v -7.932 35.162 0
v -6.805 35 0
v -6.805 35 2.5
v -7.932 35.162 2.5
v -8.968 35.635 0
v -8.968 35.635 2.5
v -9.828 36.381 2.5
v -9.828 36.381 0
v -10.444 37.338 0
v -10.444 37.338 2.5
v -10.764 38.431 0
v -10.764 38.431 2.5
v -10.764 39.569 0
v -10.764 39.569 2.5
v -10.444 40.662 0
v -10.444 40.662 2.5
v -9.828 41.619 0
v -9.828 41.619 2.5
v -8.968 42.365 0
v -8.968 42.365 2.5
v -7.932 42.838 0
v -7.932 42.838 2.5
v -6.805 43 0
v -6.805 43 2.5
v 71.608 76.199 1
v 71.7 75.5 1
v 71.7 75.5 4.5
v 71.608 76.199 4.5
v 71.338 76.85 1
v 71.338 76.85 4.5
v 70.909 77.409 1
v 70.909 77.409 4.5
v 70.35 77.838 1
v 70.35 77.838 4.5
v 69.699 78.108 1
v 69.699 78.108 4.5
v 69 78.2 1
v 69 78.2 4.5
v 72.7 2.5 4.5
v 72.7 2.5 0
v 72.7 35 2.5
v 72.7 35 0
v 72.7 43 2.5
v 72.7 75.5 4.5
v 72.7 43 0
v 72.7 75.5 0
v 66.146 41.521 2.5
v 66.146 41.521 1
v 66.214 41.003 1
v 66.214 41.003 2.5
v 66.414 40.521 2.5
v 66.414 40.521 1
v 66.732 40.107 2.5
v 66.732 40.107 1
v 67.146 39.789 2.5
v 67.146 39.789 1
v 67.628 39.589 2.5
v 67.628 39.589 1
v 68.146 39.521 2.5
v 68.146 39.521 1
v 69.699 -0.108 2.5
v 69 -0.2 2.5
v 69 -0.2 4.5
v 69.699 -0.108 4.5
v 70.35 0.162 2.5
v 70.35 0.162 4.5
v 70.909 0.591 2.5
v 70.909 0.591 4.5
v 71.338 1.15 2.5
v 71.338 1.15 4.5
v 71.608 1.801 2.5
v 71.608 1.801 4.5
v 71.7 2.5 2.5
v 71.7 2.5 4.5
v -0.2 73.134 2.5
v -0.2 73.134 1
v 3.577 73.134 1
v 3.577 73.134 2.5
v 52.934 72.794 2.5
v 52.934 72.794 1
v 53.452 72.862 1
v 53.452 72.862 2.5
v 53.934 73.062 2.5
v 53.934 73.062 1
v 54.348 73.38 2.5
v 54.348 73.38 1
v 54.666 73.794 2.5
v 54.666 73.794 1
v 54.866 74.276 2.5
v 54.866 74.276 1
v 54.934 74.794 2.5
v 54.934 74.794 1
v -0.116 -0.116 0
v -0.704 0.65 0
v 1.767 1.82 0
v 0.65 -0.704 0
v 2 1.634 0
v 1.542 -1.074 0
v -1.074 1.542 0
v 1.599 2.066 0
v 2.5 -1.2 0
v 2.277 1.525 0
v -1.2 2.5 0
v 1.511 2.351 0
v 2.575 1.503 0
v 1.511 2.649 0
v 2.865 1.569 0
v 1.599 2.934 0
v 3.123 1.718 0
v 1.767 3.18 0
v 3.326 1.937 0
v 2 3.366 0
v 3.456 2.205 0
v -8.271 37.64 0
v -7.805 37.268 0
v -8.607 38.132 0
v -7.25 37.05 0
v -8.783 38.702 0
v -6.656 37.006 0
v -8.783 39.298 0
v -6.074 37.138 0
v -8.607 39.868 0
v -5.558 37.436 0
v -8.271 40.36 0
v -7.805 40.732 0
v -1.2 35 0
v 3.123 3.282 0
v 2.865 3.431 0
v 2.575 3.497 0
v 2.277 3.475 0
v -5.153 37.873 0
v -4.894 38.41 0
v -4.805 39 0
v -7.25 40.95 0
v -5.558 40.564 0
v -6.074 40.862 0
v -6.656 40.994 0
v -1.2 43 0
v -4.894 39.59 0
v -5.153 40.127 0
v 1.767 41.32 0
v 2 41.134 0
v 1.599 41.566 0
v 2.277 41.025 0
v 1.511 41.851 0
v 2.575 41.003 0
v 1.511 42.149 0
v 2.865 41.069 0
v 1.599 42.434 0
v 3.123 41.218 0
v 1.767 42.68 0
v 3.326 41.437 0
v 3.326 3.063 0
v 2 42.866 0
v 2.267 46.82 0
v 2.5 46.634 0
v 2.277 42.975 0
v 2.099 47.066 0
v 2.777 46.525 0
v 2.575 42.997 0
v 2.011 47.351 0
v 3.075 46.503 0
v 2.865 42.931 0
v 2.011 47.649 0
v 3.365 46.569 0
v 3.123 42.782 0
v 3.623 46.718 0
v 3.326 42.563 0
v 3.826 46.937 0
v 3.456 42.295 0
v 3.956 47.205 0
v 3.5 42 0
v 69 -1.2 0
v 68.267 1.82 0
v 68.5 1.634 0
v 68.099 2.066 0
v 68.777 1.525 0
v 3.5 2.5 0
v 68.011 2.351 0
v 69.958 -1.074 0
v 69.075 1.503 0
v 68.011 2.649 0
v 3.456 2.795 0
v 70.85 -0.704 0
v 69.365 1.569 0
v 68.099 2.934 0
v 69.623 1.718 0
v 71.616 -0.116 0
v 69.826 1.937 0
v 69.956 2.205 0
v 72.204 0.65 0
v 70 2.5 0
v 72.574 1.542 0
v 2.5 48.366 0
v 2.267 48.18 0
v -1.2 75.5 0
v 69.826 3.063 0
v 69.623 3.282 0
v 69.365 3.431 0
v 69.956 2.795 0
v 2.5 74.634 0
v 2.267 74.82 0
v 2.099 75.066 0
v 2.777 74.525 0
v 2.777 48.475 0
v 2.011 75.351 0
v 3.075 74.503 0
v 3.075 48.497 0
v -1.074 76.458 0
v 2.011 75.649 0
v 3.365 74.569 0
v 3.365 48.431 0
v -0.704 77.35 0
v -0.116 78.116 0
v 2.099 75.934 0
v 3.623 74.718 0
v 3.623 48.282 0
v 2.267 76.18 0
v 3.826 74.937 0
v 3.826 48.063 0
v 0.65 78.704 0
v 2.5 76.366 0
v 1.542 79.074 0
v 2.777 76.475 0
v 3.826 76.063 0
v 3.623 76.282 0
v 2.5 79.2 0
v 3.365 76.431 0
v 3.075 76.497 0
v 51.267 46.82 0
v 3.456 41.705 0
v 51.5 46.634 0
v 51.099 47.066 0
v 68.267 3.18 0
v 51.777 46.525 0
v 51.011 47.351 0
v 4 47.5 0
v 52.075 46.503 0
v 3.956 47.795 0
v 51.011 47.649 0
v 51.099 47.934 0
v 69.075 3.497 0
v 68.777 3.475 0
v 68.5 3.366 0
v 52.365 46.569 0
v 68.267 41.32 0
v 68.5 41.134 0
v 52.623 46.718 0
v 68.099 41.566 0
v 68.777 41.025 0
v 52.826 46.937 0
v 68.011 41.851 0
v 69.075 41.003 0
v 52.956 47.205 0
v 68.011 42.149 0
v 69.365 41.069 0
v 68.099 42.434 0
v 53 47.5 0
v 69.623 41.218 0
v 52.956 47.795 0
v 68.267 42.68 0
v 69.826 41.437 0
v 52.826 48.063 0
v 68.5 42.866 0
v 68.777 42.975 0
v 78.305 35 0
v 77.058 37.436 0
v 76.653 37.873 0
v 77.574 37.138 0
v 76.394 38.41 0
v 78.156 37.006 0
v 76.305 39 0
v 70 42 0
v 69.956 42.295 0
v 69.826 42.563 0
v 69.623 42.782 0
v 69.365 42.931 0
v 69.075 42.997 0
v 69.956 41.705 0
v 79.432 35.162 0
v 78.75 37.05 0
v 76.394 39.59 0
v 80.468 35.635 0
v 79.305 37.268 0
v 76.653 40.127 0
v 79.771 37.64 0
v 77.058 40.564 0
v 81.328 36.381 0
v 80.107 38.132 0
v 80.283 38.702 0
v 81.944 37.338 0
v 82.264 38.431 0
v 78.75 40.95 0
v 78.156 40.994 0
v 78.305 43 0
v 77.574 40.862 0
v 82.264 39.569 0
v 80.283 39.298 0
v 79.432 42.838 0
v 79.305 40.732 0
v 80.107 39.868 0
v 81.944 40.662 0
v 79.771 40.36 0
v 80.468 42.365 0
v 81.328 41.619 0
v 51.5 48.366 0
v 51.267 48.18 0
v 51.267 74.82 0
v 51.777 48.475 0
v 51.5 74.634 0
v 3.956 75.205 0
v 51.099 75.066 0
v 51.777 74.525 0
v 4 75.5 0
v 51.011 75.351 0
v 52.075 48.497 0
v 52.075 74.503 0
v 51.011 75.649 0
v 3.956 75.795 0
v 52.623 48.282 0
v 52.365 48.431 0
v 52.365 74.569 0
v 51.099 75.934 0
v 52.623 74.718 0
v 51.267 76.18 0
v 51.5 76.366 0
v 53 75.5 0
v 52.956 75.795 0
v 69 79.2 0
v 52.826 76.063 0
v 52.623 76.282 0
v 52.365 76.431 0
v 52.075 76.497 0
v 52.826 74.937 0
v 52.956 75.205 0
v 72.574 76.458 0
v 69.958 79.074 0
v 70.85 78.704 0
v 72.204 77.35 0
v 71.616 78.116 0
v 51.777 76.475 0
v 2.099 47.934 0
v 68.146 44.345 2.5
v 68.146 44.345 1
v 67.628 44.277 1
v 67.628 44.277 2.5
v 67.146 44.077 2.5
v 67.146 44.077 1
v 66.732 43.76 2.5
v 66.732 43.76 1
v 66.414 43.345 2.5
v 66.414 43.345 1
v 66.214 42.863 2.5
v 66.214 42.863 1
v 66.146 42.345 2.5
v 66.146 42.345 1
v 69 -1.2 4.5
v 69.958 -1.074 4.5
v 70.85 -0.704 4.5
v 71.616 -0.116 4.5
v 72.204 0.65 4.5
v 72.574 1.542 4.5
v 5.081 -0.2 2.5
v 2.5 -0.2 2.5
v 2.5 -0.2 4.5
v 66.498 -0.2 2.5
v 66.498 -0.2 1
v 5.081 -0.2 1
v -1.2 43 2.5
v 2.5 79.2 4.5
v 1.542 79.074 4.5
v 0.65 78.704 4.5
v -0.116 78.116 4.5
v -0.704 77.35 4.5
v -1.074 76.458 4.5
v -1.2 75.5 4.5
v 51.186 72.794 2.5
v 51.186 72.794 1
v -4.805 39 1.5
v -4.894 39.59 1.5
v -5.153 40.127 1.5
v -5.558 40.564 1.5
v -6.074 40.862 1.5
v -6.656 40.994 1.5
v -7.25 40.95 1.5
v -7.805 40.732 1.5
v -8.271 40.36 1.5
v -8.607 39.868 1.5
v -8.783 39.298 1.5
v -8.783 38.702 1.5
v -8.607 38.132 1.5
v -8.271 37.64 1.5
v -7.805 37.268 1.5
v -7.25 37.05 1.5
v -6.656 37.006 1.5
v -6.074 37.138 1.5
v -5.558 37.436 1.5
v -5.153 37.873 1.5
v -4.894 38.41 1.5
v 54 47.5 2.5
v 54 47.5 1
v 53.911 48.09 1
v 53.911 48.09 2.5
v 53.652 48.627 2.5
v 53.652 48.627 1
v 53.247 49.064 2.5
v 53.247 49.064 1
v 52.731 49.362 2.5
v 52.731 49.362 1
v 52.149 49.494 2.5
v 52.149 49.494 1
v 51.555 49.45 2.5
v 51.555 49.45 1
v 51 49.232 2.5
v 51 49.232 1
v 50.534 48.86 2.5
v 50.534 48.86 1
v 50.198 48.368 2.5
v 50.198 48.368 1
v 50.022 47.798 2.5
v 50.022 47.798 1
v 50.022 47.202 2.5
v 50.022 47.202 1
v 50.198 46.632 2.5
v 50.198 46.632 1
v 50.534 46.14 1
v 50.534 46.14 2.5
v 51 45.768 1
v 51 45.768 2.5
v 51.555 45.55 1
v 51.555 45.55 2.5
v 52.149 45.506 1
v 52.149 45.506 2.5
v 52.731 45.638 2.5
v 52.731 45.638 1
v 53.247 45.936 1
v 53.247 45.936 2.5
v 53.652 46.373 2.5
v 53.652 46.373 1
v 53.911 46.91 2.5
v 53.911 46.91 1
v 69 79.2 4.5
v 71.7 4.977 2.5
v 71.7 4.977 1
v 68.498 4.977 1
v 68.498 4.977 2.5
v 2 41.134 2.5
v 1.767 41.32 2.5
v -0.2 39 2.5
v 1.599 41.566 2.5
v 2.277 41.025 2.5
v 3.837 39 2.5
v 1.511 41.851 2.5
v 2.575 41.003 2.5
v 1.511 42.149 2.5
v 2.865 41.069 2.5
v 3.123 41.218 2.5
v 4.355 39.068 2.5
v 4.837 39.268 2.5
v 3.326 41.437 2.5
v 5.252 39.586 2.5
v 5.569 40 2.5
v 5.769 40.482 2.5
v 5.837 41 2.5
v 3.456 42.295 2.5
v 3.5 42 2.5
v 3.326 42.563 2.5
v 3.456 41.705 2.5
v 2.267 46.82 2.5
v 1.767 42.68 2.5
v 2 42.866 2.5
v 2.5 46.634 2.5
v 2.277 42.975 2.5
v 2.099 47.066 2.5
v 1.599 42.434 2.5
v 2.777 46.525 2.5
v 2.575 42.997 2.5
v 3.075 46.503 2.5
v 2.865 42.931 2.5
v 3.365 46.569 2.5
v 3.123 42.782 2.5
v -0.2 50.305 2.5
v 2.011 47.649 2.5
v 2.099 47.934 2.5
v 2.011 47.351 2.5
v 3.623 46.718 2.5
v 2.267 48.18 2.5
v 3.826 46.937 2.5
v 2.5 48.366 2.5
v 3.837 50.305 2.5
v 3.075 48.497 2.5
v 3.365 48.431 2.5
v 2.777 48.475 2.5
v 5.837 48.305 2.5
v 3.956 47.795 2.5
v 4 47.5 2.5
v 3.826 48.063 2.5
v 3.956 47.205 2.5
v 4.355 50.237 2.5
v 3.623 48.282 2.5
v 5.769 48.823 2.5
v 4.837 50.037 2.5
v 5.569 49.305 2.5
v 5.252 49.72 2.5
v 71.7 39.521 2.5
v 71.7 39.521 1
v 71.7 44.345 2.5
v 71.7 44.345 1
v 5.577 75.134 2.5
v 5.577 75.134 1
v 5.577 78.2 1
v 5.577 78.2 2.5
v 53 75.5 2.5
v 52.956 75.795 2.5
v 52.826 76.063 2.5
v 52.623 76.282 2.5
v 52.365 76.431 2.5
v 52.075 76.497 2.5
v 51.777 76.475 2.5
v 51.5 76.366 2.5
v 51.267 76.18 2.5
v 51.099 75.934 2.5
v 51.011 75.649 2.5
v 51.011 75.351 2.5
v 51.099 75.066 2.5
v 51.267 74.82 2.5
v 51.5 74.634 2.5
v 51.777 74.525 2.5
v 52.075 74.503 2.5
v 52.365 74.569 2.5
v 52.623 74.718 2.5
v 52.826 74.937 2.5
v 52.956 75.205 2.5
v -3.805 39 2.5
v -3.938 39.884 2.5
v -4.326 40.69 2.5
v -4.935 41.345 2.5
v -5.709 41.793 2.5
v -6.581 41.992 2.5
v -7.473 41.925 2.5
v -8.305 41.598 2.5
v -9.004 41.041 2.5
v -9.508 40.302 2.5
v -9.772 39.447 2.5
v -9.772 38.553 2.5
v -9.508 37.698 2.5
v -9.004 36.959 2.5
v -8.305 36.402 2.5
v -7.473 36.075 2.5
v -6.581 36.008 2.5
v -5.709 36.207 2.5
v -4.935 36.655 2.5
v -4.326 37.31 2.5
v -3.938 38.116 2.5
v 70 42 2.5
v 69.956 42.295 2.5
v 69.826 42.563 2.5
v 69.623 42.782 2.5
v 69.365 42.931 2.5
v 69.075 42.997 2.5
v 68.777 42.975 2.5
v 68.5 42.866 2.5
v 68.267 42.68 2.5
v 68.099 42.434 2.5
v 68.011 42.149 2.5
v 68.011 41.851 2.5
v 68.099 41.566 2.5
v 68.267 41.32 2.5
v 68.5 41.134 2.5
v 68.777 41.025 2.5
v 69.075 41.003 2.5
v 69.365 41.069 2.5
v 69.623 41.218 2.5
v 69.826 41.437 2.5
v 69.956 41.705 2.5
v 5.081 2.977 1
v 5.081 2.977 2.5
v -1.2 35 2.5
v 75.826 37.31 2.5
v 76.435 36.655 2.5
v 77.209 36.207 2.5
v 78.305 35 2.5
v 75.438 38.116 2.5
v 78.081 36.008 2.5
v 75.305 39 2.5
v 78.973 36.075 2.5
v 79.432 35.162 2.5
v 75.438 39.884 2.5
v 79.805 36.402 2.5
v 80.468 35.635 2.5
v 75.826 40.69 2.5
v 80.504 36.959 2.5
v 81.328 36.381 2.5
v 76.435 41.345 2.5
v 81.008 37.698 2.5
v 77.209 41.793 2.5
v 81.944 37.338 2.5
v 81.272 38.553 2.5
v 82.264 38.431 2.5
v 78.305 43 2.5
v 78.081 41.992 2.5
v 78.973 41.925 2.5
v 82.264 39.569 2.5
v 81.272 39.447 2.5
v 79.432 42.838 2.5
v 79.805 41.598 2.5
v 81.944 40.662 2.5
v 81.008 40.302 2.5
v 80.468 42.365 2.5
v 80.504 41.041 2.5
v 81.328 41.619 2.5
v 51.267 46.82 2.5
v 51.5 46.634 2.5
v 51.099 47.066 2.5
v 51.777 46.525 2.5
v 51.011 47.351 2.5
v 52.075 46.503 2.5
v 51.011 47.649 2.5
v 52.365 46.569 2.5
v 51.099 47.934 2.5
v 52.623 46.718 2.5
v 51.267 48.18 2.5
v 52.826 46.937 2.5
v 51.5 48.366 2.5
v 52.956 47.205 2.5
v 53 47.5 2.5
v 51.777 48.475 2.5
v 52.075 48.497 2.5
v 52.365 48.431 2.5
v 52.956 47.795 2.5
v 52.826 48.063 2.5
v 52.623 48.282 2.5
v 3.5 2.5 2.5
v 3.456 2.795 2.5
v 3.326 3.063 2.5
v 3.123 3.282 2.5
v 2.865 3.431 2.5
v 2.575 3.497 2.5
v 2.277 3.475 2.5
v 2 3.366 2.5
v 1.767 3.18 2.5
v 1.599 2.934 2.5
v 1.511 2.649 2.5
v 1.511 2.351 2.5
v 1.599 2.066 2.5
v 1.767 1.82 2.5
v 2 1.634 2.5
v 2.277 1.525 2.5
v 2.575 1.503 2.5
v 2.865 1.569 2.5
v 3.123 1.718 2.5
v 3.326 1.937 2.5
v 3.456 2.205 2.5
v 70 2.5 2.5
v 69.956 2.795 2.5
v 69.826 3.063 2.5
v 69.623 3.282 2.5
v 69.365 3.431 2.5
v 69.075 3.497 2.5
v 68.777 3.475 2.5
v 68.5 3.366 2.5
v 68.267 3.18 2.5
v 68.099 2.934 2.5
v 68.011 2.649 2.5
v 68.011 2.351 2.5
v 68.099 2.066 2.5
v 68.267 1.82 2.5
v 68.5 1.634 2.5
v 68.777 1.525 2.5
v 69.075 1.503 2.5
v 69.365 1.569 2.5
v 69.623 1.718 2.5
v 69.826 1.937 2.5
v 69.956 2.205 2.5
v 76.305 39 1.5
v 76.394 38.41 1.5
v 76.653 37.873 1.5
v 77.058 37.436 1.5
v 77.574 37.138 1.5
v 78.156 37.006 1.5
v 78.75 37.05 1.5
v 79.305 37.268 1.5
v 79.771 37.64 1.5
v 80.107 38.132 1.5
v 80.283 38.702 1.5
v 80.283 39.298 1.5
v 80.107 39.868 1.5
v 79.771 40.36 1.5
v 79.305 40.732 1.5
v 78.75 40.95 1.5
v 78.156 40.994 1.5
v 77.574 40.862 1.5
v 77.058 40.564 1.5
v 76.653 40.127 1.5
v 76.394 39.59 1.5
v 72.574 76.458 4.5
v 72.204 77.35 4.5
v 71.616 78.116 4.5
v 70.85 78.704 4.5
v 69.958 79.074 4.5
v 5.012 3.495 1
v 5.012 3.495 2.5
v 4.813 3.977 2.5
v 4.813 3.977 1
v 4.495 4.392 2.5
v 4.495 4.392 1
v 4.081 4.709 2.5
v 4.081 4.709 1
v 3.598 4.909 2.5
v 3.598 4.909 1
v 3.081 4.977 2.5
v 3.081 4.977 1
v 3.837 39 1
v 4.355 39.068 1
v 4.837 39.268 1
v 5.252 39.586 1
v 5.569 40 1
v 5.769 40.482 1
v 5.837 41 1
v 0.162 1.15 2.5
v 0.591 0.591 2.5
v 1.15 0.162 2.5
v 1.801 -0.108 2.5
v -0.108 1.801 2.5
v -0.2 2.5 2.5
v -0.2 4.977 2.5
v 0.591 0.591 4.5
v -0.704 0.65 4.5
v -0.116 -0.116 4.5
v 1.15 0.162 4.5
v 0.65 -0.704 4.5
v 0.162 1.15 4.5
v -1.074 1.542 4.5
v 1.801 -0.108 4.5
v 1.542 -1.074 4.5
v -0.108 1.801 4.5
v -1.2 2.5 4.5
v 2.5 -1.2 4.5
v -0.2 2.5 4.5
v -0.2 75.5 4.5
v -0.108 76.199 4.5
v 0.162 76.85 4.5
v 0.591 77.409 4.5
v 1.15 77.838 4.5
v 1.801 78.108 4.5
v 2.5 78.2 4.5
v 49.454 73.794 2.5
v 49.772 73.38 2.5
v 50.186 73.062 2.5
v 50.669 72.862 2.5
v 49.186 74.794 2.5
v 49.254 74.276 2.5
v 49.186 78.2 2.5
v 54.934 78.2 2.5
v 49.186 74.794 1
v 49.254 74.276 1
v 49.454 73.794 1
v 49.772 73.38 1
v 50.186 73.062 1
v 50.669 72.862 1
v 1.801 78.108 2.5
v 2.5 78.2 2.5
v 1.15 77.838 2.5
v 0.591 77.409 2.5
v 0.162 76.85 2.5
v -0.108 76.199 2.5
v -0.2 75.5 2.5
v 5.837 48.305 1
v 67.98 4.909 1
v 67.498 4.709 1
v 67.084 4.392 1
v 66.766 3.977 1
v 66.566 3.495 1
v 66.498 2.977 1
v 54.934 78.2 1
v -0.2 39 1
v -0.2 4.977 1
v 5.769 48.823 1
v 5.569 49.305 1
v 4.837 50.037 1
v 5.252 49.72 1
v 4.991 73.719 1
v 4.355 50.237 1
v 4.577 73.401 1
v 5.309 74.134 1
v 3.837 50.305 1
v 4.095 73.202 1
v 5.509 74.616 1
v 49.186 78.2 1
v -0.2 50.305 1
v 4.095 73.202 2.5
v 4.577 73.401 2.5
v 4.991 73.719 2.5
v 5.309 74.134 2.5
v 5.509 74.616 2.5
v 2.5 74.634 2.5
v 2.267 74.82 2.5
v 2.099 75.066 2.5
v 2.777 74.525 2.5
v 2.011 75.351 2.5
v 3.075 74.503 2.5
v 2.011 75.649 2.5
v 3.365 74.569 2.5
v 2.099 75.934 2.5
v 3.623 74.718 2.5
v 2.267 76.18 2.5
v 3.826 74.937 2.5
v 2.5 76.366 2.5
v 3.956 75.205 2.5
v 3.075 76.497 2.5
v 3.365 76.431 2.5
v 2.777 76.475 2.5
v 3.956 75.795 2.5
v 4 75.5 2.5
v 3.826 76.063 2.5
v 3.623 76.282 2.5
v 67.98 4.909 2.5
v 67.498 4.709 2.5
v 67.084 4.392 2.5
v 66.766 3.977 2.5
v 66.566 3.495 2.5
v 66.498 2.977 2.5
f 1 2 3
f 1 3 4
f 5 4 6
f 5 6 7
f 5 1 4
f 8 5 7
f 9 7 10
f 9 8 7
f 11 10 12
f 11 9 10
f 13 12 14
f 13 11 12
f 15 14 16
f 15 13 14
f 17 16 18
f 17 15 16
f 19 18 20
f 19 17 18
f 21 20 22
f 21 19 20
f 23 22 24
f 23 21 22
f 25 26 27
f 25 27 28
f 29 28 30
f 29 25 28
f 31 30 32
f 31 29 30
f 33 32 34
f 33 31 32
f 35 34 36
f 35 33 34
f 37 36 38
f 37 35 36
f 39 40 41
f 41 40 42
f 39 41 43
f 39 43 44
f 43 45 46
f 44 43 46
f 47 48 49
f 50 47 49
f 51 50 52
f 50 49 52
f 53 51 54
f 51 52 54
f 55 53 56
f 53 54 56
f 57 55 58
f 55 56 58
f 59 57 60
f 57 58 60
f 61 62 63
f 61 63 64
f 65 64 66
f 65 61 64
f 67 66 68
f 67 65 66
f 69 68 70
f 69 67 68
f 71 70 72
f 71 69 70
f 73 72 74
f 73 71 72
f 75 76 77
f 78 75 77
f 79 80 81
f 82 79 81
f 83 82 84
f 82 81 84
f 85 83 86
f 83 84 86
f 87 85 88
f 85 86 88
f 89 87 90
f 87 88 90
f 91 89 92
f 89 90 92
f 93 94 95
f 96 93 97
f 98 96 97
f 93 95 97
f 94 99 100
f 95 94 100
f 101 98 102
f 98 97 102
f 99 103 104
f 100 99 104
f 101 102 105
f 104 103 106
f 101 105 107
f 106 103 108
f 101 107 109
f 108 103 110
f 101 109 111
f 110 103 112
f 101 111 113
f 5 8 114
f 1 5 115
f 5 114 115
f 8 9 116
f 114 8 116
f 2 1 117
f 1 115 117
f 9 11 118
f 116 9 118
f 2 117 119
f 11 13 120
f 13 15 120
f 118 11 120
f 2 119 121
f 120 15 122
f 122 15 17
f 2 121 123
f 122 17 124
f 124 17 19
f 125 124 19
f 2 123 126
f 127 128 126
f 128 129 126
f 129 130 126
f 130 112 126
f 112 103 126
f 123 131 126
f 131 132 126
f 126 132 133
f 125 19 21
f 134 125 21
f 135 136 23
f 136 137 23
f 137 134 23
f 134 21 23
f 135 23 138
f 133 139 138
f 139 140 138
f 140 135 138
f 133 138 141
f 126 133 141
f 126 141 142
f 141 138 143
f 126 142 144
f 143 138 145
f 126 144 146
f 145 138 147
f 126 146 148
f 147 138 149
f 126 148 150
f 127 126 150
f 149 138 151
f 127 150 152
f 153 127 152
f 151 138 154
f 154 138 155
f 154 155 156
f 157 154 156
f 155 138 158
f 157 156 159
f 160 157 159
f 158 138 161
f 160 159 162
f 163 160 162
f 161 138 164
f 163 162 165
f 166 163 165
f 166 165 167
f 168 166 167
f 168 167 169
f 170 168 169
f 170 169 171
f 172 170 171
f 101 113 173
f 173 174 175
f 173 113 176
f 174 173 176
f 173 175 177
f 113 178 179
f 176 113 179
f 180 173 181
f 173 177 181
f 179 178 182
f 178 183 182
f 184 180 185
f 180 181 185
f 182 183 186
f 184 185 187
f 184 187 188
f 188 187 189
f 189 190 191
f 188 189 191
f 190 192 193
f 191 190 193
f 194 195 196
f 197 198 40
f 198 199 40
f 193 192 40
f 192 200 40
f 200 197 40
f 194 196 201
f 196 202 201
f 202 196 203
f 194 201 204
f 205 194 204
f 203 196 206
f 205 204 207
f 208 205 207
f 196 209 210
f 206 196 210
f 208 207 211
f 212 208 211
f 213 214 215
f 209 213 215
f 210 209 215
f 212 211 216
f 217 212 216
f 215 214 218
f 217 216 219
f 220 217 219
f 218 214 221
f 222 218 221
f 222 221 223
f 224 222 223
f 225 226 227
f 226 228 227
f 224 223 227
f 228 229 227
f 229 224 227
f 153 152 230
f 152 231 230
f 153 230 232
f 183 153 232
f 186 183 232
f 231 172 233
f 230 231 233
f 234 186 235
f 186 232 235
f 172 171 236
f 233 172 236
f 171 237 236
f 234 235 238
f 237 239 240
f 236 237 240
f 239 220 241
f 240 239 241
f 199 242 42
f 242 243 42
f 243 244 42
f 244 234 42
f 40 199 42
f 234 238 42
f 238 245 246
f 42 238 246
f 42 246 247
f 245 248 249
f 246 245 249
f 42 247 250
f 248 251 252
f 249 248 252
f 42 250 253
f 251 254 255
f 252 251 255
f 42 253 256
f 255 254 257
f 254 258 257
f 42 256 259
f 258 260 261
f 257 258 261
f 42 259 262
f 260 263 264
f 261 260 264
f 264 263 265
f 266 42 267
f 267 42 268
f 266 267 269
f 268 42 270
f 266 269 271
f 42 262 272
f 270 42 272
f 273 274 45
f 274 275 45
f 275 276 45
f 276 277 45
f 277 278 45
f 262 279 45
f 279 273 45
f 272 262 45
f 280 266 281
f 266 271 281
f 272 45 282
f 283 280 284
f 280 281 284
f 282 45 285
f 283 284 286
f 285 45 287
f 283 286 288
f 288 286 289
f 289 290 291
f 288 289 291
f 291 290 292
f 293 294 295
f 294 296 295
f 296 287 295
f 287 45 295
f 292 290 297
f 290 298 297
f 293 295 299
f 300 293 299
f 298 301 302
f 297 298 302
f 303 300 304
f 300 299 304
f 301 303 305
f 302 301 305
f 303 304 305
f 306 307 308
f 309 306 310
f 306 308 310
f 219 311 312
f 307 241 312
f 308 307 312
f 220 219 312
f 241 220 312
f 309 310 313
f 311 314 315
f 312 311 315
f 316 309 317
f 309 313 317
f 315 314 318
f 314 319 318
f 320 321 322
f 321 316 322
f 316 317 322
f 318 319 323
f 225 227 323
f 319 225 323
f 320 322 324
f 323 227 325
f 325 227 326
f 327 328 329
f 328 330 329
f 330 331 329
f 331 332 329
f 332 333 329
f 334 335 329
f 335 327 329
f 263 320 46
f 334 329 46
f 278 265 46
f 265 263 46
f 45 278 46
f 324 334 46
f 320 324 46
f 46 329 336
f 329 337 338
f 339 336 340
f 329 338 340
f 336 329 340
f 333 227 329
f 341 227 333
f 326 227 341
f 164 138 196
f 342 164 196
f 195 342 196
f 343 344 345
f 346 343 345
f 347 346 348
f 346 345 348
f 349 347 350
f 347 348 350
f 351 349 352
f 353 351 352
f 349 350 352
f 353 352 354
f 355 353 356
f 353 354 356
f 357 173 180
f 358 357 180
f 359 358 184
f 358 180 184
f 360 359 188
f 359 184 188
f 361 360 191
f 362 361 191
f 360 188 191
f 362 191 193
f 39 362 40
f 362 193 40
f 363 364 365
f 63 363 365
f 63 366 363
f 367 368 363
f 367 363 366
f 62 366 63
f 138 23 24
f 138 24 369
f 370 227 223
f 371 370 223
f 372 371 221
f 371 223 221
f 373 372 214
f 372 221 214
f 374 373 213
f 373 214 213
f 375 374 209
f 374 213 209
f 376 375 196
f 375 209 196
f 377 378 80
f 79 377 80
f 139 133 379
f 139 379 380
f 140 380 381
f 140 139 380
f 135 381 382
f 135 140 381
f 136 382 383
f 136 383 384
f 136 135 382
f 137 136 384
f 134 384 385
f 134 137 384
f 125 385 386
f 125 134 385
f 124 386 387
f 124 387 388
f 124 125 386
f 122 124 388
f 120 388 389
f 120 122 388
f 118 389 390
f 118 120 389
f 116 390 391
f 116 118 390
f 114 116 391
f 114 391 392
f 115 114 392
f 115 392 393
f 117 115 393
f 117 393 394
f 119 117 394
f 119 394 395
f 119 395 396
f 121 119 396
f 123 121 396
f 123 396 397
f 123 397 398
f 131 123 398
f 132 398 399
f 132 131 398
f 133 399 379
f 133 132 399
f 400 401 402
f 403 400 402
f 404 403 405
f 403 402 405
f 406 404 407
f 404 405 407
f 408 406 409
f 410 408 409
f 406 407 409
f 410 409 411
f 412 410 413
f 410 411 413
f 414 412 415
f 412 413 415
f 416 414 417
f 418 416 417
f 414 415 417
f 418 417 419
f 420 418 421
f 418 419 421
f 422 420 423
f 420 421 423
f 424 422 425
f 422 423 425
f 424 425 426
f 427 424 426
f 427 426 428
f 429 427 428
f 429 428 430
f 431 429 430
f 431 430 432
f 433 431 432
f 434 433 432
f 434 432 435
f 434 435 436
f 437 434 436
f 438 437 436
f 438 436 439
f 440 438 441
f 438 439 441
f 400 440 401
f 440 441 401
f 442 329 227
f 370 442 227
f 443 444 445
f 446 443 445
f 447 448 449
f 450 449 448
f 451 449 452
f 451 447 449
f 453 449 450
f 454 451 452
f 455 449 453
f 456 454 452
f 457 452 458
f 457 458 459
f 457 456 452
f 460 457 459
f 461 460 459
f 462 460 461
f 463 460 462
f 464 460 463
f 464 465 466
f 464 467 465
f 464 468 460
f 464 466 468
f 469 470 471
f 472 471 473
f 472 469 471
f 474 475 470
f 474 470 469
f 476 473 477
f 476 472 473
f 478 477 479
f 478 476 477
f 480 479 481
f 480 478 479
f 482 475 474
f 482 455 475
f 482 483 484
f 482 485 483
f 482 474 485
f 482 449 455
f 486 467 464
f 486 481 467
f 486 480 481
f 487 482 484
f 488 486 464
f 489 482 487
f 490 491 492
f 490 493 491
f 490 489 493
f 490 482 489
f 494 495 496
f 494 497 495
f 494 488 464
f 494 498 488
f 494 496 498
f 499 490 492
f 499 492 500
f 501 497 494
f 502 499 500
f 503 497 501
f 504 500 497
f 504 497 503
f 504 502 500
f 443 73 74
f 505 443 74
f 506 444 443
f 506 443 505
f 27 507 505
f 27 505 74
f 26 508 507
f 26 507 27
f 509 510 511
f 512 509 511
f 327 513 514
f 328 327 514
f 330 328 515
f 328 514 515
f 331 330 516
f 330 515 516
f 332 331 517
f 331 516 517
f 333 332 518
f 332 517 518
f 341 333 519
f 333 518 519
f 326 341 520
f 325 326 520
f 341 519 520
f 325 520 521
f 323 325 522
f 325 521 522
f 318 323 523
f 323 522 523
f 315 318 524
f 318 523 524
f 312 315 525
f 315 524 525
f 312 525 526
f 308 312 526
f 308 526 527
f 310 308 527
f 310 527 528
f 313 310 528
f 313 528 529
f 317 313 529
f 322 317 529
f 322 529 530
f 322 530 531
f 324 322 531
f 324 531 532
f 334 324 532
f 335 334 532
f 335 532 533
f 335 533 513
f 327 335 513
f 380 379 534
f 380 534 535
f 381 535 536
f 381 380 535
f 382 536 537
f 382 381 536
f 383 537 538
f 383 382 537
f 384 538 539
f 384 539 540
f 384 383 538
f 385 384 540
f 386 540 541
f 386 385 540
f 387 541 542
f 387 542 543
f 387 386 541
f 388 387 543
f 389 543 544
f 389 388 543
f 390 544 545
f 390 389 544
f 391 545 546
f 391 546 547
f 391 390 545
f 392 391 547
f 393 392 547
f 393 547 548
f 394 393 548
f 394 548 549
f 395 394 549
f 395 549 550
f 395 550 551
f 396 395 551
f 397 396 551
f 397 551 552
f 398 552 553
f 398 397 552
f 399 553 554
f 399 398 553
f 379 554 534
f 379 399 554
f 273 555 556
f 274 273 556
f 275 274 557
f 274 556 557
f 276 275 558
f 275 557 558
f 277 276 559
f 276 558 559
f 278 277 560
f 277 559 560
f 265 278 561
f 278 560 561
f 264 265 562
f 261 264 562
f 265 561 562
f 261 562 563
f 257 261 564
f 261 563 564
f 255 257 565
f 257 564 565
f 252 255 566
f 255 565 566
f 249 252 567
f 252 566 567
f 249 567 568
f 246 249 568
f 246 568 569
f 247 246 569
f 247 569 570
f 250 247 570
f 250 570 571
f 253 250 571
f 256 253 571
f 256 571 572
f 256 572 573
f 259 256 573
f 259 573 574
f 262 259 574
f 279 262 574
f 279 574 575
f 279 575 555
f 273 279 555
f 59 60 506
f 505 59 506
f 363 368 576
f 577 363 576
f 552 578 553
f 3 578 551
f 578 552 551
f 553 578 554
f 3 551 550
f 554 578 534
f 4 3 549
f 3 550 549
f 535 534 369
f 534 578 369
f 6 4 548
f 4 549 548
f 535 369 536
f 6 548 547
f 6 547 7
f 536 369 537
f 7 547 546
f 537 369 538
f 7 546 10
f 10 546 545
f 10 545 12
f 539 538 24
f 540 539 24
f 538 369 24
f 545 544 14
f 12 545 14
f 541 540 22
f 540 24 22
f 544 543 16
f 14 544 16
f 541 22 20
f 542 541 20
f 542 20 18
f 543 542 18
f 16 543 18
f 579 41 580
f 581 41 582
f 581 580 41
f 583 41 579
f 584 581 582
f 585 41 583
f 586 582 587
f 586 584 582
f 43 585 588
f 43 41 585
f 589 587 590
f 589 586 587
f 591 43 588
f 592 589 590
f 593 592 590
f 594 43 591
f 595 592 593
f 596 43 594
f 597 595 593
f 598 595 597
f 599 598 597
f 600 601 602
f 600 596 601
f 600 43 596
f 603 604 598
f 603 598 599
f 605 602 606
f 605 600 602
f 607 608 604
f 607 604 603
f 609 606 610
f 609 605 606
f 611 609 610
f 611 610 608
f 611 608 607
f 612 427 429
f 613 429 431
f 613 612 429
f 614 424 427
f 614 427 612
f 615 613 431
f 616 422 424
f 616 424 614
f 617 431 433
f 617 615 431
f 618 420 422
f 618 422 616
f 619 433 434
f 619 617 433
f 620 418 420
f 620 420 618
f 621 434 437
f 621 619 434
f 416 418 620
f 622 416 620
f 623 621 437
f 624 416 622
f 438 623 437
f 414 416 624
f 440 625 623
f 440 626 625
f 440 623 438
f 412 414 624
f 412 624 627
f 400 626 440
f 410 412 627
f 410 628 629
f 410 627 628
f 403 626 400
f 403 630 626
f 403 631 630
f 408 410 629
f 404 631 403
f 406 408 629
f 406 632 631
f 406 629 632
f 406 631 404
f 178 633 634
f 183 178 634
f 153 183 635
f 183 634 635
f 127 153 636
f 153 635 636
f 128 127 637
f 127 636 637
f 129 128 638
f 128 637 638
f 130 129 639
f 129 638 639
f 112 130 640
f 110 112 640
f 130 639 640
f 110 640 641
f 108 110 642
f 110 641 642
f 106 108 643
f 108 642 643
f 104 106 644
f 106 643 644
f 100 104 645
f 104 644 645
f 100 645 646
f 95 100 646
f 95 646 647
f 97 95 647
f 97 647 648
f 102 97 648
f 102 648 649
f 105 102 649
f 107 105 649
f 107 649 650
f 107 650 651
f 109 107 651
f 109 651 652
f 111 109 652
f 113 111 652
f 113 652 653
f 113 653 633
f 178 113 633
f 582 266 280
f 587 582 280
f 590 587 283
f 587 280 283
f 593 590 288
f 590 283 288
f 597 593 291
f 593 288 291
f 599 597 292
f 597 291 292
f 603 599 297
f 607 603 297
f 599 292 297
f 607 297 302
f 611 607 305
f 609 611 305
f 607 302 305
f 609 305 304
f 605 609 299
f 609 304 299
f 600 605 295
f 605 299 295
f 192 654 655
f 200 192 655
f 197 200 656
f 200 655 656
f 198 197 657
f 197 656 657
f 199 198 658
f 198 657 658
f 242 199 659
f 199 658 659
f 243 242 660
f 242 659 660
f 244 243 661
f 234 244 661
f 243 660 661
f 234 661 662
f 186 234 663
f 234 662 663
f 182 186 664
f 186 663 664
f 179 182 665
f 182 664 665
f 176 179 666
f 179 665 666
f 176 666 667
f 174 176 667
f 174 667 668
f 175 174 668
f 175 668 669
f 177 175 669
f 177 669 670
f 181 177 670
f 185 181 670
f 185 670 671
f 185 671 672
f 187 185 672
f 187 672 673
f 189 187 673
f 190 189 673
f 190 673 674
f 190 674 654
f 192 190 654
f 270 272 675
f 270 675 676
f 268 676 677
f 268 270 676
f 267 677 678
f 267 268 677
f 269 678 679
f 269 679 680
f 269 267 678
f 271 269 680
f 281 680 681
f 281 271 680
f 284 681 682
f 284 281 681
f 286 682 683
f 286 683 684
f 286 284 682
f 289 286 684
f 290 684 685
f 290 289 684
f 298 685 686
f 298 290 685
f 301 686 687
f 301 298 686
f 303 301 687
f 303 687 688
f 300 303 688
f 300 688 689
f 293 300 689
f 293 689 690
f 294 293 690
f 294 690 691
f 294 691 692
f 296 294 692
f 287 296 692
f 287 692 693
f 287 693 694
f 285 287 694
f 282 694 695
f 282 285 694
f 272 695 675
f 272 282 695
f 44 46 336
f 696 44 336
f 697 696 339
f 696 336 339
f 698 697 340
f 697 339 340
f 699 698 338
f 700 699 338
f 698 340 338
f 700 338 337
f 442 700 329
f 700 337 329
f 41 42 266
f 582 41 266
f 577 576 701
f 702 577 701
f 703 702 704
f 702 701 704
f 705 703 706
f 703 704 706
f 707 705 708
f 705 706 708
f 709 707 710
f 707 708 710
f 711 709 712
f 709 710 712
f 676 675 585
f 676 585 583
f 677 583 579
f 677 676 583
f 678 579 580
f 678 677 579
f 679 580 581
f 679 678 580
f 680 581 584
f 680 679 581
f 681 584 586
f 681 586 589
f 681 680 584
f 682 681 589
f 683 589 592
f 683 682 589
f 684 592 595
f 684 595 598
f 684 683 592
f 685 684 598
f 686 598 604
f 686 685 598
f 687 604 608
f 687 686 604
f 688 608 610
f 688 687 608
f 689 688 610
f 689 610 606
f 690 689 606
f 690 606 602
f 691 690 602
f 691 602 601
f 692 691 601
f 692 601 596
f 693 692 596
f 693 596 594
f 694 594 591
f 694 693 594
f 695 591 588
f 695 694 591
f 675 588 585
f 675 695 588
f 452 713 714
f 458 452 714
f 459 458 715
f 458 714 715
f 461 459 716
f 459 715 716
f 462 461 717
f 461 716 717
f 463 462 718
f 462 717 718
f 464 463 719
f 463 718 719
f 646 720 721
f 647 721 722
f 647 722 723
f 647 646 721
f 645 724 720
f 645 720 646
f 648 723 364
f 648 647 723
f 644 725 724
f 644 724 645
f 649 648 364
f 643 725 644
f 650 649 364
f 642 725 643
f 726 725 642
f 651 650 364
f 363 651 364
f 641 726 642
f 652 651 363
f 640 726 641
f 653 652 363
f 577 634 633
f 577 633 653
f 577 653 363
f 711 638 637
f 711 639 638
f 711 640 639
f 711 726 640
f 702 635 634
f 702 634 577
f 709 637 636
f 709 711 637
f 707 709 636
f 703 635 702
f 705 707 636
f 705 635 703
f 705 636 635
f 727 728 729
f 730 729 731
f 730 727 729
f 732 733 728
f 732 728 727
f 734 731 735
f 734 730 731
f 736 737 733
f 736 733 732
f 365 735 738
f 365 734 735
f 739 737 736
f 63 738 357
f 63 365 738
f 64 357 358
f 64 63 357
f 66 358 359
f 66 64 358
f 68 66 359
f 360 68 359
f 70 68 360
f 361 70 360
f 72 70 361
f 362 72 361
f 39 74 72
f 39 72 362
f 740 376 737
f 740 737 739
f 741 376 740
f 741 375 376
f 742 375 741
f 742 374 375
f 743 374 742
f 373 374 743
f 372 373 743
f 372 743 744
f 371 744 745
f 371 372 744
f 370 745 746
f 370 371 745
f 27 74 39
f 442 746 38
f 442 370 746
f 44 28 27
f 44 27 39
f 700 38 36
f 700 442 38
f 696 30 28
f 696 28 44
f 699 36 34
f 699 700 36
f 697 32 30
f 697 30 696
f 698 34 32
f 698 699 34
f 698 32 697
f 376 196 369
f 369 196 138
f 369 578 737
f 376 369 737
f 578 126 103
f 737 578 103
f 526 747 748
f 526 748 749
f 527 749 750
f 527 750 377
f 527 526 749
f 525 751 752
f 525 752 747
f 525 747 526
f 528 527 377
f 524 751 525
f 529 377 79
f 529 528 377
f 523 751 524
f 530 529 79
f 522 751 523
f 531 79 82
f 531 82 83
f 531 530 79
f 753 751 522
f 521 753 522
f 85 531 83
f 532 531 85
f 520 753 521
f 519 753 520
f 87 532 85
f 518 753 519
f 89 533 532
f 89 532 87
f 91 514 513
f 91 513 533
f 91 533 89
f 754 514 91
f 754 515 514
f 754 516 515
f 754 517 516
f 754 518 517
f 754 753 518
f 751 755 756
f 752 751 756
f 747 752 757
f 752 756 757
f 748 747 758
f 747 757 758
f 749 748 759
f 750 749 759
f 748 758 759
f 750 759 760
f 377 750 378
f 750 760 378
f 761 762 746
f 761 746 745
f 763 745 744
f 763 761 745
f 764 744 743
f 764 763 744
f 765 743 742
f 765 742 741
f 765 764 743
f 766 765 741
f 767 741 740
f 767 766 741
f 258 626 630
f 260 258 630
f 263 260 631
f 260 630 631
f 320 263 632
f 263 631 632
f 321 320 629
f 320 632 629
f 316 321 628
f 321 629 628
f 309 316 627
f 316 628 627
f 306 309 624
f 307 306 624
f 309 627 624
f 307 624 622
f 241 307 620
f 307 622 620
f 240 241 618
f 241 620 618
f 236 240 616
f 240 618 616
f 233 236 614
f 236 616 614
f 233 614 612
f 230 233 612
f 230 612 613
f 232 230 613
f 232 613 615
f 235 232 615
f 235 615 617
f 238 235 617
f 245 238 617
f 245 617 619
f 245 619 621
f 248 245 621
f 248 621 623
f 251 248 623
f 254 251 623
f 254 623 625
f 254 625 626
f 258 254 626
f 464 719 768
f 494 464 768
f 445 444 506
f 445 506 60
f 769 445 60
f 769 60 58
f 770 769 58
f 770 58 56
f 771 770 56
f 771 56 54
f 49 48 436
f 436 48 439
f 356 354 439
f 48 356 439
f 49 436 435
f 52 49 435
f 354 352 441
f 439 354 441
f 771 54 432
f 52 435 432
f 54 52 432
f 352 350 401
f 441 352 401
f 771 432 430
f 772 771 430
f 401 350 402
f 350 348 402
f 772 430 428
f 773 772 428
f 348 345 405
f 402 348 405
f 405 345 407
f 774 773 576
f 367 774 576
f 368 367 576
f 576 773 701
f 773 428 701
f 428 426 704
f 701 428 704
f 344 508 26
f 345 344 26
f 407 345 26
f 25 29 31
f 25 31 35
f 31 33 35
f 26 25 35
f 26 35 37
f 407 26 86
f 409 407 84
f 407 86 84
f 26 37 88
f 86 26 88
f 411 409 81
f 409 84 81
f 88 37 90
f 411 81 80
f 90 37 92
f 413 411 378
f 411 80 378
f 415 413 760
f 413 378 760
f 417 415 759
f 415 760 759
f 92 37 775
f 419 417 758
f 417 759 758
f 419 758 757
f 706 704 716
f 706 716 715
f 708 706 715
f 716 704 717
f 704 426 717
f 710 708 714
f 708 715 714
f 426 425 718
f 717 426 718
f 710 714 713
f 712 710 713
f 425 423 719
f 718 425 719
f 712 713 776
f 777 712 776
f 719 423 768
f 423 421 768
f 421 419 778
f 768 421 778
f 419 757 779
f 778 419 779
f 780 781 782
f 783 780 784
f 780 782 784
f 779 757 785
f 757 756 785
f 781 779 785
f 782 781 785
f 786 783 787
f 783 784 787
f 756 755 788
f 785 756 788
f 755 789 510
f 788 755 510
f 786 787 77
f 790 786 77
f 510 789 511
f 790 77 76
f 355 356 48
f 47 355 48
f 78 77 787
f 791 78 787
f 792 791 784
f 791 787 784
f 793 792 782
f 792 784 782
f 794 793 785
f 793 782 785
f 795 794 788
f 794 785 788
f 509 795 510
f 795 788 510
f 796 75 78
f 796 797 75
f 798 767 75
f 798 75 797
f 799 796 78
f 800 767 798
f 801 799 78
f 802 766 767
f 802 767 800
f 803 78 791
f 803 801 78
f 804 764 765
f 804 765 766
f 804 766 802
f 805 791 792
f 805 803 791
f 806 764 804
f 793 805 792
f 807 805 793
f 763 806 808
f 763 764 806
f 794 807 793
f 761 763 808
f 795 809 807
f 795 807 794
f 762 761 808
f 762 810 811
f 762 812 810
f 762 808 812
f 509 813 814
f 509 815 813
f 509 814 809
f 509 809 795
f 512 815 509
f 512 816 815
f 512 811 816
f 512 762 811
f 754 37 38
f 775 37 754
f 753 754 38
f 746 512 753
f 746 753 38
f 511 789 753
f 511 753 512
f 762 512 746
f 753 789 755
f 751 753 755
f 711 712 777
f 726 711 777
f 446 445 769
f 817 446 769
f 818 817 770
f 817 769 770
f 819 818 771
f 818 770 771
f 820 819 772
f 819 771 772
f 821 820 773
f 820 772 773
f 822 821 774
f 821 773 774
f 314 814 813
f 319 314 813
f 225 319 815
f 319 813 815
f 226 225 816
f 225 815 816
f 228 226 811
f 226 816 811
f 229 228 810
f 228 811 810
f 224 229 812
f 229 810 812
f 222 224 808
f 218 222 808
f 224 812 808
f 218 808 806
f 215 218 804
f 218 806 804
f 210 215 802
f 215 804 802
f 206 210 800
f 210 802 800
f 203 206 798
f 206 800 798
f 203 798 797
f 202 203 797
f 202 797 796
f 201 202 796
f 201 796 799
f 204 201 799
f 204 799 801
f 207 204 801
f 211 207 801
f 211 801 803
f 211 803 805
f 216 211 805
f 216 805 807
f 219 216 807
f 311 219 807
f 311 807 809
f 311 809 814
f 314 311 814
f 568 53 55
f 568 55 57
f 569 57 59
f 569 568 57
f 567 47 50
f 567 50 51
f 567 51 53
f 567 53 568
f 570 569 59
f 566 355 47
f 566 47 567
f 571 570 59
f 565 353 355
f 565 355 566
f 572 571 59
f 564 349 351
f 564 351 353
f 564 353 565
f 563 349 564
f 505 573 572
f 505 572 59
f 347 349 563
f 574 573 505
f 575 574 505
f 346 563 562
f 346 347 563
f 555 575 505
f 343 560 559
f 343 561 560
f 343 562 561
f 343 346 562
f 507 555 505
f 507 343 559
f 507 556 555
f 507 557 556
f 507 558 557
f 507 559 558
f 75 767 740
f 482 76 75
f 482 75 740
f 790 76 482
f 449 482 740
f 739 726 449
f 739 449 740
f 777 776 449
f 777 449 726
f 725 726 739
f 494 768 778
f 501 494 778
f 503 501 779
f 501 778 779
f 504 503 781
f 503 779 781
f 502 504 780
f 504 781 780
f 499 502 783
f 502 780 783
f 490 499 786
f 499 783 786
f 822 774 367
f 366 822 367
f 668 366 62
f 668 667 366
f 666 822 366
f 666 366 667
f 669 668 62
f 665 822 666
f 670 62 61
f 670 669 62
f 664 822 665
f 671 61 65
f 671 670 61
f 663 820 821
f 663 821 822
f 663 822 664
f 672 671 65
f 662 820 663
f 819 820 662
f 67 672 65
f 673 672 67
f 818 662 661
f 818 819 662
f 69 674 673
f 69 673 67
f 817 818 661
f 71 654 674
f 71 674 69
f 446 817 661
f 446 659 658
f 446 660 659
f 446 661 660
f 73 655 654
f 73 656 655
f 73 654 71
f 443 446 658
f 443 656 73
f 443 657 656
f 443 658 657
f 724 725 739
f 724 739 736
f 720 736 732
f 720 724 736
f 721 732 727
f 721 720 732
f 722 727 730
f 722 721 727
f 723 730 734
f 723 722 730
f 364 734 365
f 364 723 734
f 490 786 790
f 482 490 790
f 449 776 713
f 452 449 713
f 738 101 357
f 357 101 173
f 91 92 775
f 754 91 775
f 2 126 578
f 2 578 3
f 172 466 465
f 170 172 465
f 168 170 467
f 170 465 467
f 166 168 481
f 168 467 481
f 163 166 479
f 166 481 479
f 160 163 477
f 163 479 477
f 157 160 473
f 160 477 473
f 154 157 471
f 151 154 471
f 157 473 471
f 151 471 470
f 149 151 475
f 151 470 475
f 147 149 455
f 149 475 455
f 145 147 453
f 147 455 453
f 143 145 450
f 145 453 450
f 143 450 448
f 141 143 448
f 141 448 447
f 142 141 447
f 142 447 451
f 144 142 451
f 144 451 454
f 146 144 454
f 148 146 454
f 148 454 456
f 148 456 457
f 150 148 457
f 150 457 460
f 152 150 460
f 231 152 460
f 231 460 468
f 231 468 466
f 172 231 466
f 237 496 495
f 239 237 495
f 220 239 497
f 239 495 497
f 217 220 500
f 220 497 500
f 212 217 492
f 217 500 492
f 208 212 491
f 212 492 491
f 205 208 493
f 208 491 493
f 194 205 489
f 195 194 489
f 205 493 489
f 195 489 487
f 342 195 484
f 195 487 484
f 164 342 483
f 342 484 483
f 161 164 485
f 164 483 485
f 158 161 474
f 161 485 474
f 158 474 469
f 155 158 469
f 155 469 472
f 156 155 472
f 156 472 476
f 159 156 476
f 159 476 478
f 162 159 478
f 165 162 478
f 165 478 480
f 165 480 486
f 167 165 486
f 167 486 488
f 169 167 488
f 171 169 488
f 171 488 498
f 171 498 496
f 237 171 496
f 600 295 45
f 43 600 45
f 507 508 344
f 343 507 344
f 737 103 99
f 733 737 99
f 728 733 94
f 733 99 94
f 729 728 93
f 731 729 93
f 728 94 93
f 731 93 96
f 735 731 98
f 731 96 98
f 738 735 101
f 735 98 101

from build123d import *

# Parameters (mm, degrees)
EXTRUDE_1_DEPTH     = 1
EXTRUDE_2_DEPTH     = 4.5
SKETCH_4_R          = 2
EXTRUDE_3_DEPTH     = 2.5
CHAMFER_1_SIZE      = 1
EXTRUDE_4_OUTLINE_R = 2
EXTRUDE_4_DEPTH     = 1.5
SKETCH_6_R          = 1
CUT_EXTRUDE_1_DEPTH = 115.249760713


# Read off the part's stored shape, not the designer's step: Бобышка-Вытянуть4
with BuildPart() as part:
    # Эскиз2 → Бобышка-Вытянуть1 (new body)
    with BuildSketch(Plane.XY):
        with BuildLine():
            Line((2.50000008, 78.20000148), (68.99999916, 78.19999894))
            ThreePointArc((68.99999916, 78.19999894), (70.909187526, 77.409187226), (71.69999924, 75.49999886))
            Line((71.69999924, 75.49999886), (71.70000051, 2.500002823))
            ThreePointArc((71.70000051, 2.500002823), (70.909189394, 0.590811786), (68.99999916, -0.20000127))
            Line((68.99999916, -0.20000127), (2.50000008, -0.20000127))
            ThreePointArc((2.50000008, -0.20000127), (0.590809846, 0.590811786), (-0.20000127, 2.500002823))
            Line((-0.20000127, 2.500002823), (-0.20000254, 75.49999886))
            ThreePointArc((-0.20000254, 75.49999886), (0.590809918, 77.409189022), (2.50000008, 78.20000148))
        make_face()
    extrude(amount=EXTRUDE_1_DEPTH)

    # Эскиз3 → Бобышка-Вытянуть2 (add)
    with BuildSketch(Plane.XY):
        with BuildLine():
            Line((-1.20000254, 75.49999886), (-1.20000127, 2.500002806))
            ThreePointArc((-1.20000127, 2.500002806), (-0.116296929, -0.116295001), (2.50000008, -1.20000127))
            Line((2.50000008, -1.20000127), (68.99999916, -1.20000127))
            ThreePointArc((68.99999916, -1.20000127), (71.616296534, -0.116294636), (72.70000051, 2.500003839))
            Line((72.70000051, 2.500003839), (72.69999924, 75.499998877))
            ThreePointArc((72.69999924, 75.499998877), (71.616294301, 78.116294013), (68.99999916, 79.19999894))
            Line((68.99999916, 79.19999894), (2.50000008, 79.20000148))
            ThreePointArc((2.50000008, 79.20000148), (-0.116296863, 78.116295803), (-1.20000254, 75.49999886))
        make_face()
        with BuildLine():
            Line((-0.20000254, 75.49999886), (-0.20000127, 2.500002823))
            ThreePointArc((-0.20000127, 2.500002823), (0.590809846, 0.590811786), (2.50000008, -0.20000127))
            Line((2.50000008, -0.20000127), (68.99999916, -0.20000127))
            ThreePointArc((68.99999916, -0.20000127), (70.909189394, 0.590811786), (71.70000051, 2.500002823))
            Line((71.70000051, 2.500002823), (71.69999924, 75.49999886))
            ThreePointArc((71.69999924, 75.49999886), (70.909187526, 77.409187226), (68.99999916, 78.19999894))
            Line((68.99999916, 78.19999894), (2.50000008, 78.20000148))
            ThreePointArc((2.50000008, 78.20000148), (0.590809918, 77.409189022), (-0.20000254, 75.49999886))
        make_face(mode=Mode.SUBTRACT)
    extrude(amount=EXTRUDE_2_DEPTH)


with BuildPart() as extrude_3_tool:
    # Эскиз4 → Бобышка-Вытянуть3 (new body)
    # profile 1 of 2: a face of its own
    with BuildSketch(Plane.XY):
        with BuildLine():
            Line((-6.805028483, 42.99999886), (-1.200001975, 42.99999886))
            Line((-1.200001975, 42.99999886), (-1.200001835, 34.99999886))
            Line((-1.200001835, 34.99999886), (-6.805028483, 34.99999886))
            ThreePointArc((-6.805028483, 34.99999886), (-10.805028483, 38.99999886), (-6.805028483, 42.99999886))
        make_face()
        with Locations((-6.805028483, 38.99999886)):
            Circle(SKETCH_4_R, mode=Mode.SUBTRACT)
    # profile 2 of 2: a face of its own
    with BuildSketch(Plane.XY):
        with BuildLine():
            Line((72.700001075, 34.99999886), (78.305027723, 34.99999886))
            ThreePointArc((78.305027723, 34.99999886), (82.305027723, 38.99999886), (78.305027723, 42.99999886))
            Line((78.305027723, 42.99999886), (72.700001215, 42.99999886))
            Line((72.700001215, 42.99999886), (72.700001075, 34.99999886))
        make_face()
        with Locations(Location((78.305027723, 38.99999886, 0), (0, 0, 180))):
            Circle(SKETCH_4_R, mode=Mode.SUBTRACT)
    extrude(amount=EXTRUDE_3_DEPTH)


with BuildPart() as part_1:
    add(part.part)


with BuildPart() as part_2:
    # Бобышка-Вытянуть3: joined with extrude_3_tool
    add(part_1.part.fuse(extrude_3_tool.part, tol=0.00001))

    # Фаска1
    chamfer_1_edges = [part_2.edges().sort_by_distance(p)[0] for p in [
        (-8.805028483, 38.99999886, 2.5),
        (80.305027723, 38.99999886, 2.5),
    ]]
    chamfer(chamfer_1_edges, length=CHAMFER_1_SIZE)

    # Бобышка-Вытянуть4 outline → Бобышка-Вытянуть4 (add)
    with BuildSketch(Plane.XY.offset(1)):
        with BuildLine():
            Line((68.14600291, 39.521136107), (71.699999866, 39.521136107))
            Line((71.699999866, 39.521136107), (71.699999782, 44.345437587))
            Line((71.699999782, 44.345437587), (68.14600291, 44.345437587))
            ThreePointArc((68.14600291, 44.345437587), (66.731789347, 43.75965115), (66.14600291, 42.345437587))
            Line((66.14600291, 42.345437587), (66.14600291, 41.521136107))
            ThreePointArc((66.14600291, 41.521136107), (66.731789347, 40.106922544), (68.14600291, 39.521136107))
        make_face()
        with BuildLine():
            Line((66.497946234, 2.977437415), (66.497946234, -0.20000127))
            Line((66.497946234, -0.20000127), (68.99999916, -0.20000127))
            ThreePointArc((68.99999916, -0.20000127), (70.909189394, 0.590811786), (71.70000051, 2.500002823))
            Line((71.70000051, 2.500002823), (71.700000467, 4.977437415))
            Line((71.700000467, 4.977437415), (68.497946234, 4.977437415))
            ThreePointArc((68.497946234, 4.977437415), (67.083732671, 4.391650978), (66.497946234, 2.977437415))
        make_face()
        with BuildLine():
            Line((54.934013046, 78.199999477), (49.186165717, 78.199999697))
            Line((49.186165717, 78.199999697), (49.186165717, 74.793776217))
            ThreePointArc((49.186165717, 74.793776217), (49.771952154, 73.379562654), (51.186165717, 72.793776217))
            Line((51.186165717, 72.793776217), (52.934013046, 72.793776217))
            ThreePointArc((52.934013046, 72.793776217), (54.348226608, 73.379562655), (54.934013046, 74.793776217))
            Line((54.934013046, 74.793776217), (54.934013046, 78.199999477))
        make_face()
        with BuildLine():
            Line((-0.20000254, 75.49999886), (-0.200002499, 73.133544525))
            Line((-0.200002499, 73.133544525), (3.577150519, 73.133544525))
            ThreePointArc((3.577150519, 73.133544525), (4.991364081, 73.719330963), (5.577150519, 75.133544525))
            Line((5.577150519, 75.133544525), (5.577150519, 78.200001362))
            Line((5.577150519, 78.200001362), (2.50000008, 78.20000148))
            ThreePointArc((2.50000008, 78.20000148), (0.590809918, 77.409189022), (-0.20000254, 75.49999886))
        make_face()
        with BuildLine():
            Line((-0.200002102, 50.30535038), (-0.200001905, 39.000000842))
            Line((-0.200001905, 39.000000842), (3.837355963, 39.000000842))
            ThreePointArc((3.837355963, 39.000000842), (5.251569526, 39.585787279), (5.837355963, 41.000000842))
            Line((5.837355963, 41.000000842), (5.837355963, 48.30535038))
            ThreePointArc((5.837355963, 48.30535038), (5.251569526, 49.719563943), (3.837355963, 50.30535038))
            Line((3.837355963, 50.30535038), (-0.200002102, 50.30535038))
        make_face()
        with BuildLine():
            ThreePointArc((5.080506282, 2.977437415), (4.494719845, 4.391650977), (3.080506282, 4.977437415))
            Line((3.080506282, 4.977437415), (-0.200001313, 4.977437415))
            Line((-0.200001313, 4.977437415), (-0.20000127, 2.500002823))
            ThreePointArc((-0.20000127, 2.500002823), (0.590809846, 0.590811786), (2.50000008, -0.20000127))
            Line((2.50000008, -0.20000127), (5.080506282, -0.20000127))
            Line((5.080506282, -0.20000127), (5.080506282, 2.977437415))
        make_face()
        with Locations((52.00000014, 47.49999898)):
            Circle(EXTRUDE_4_OUTLINE_R)
    extrude(amount=EXTRUDE_4_DEPTH)

    # Эскиз6 → Вырез-Вытянуть1 (cut, through all)
    with BuildSketch(Plane.XY.offset(2.5)):
        with Locations((52.00000014, 75.49999886)):
            Circle(SKETCH_6_R)
        with Locations((2.99999908, 75.49999886)):
            Circle(SKETCH_6_R)
        with Locations((2.99999908, 47.49999898)):
            Circle(SKETCH_6_R)
        with Locations((2.50000008, 41.99999982)):
            Circle(SKETCH_6_R)
        with Locations((2.50000008, 2.50000008)):
            Circle(SKETCH_6_R)
        with Locations((68.99999916, 2.50000008)):
            Circle(SKETCH_6_R)
        with Locations((68.99999916, 41.99999982)):
            Circle(SKETCH_6_R)
        with Locations((52.00000014, 47.49999898)):
            Circle(SKETCH_6_R)
    extrude(amount=-CUT_EXTRUDE_1_DEPTH, mode=Mode.SUBTRACT)


solid = part_2.part
